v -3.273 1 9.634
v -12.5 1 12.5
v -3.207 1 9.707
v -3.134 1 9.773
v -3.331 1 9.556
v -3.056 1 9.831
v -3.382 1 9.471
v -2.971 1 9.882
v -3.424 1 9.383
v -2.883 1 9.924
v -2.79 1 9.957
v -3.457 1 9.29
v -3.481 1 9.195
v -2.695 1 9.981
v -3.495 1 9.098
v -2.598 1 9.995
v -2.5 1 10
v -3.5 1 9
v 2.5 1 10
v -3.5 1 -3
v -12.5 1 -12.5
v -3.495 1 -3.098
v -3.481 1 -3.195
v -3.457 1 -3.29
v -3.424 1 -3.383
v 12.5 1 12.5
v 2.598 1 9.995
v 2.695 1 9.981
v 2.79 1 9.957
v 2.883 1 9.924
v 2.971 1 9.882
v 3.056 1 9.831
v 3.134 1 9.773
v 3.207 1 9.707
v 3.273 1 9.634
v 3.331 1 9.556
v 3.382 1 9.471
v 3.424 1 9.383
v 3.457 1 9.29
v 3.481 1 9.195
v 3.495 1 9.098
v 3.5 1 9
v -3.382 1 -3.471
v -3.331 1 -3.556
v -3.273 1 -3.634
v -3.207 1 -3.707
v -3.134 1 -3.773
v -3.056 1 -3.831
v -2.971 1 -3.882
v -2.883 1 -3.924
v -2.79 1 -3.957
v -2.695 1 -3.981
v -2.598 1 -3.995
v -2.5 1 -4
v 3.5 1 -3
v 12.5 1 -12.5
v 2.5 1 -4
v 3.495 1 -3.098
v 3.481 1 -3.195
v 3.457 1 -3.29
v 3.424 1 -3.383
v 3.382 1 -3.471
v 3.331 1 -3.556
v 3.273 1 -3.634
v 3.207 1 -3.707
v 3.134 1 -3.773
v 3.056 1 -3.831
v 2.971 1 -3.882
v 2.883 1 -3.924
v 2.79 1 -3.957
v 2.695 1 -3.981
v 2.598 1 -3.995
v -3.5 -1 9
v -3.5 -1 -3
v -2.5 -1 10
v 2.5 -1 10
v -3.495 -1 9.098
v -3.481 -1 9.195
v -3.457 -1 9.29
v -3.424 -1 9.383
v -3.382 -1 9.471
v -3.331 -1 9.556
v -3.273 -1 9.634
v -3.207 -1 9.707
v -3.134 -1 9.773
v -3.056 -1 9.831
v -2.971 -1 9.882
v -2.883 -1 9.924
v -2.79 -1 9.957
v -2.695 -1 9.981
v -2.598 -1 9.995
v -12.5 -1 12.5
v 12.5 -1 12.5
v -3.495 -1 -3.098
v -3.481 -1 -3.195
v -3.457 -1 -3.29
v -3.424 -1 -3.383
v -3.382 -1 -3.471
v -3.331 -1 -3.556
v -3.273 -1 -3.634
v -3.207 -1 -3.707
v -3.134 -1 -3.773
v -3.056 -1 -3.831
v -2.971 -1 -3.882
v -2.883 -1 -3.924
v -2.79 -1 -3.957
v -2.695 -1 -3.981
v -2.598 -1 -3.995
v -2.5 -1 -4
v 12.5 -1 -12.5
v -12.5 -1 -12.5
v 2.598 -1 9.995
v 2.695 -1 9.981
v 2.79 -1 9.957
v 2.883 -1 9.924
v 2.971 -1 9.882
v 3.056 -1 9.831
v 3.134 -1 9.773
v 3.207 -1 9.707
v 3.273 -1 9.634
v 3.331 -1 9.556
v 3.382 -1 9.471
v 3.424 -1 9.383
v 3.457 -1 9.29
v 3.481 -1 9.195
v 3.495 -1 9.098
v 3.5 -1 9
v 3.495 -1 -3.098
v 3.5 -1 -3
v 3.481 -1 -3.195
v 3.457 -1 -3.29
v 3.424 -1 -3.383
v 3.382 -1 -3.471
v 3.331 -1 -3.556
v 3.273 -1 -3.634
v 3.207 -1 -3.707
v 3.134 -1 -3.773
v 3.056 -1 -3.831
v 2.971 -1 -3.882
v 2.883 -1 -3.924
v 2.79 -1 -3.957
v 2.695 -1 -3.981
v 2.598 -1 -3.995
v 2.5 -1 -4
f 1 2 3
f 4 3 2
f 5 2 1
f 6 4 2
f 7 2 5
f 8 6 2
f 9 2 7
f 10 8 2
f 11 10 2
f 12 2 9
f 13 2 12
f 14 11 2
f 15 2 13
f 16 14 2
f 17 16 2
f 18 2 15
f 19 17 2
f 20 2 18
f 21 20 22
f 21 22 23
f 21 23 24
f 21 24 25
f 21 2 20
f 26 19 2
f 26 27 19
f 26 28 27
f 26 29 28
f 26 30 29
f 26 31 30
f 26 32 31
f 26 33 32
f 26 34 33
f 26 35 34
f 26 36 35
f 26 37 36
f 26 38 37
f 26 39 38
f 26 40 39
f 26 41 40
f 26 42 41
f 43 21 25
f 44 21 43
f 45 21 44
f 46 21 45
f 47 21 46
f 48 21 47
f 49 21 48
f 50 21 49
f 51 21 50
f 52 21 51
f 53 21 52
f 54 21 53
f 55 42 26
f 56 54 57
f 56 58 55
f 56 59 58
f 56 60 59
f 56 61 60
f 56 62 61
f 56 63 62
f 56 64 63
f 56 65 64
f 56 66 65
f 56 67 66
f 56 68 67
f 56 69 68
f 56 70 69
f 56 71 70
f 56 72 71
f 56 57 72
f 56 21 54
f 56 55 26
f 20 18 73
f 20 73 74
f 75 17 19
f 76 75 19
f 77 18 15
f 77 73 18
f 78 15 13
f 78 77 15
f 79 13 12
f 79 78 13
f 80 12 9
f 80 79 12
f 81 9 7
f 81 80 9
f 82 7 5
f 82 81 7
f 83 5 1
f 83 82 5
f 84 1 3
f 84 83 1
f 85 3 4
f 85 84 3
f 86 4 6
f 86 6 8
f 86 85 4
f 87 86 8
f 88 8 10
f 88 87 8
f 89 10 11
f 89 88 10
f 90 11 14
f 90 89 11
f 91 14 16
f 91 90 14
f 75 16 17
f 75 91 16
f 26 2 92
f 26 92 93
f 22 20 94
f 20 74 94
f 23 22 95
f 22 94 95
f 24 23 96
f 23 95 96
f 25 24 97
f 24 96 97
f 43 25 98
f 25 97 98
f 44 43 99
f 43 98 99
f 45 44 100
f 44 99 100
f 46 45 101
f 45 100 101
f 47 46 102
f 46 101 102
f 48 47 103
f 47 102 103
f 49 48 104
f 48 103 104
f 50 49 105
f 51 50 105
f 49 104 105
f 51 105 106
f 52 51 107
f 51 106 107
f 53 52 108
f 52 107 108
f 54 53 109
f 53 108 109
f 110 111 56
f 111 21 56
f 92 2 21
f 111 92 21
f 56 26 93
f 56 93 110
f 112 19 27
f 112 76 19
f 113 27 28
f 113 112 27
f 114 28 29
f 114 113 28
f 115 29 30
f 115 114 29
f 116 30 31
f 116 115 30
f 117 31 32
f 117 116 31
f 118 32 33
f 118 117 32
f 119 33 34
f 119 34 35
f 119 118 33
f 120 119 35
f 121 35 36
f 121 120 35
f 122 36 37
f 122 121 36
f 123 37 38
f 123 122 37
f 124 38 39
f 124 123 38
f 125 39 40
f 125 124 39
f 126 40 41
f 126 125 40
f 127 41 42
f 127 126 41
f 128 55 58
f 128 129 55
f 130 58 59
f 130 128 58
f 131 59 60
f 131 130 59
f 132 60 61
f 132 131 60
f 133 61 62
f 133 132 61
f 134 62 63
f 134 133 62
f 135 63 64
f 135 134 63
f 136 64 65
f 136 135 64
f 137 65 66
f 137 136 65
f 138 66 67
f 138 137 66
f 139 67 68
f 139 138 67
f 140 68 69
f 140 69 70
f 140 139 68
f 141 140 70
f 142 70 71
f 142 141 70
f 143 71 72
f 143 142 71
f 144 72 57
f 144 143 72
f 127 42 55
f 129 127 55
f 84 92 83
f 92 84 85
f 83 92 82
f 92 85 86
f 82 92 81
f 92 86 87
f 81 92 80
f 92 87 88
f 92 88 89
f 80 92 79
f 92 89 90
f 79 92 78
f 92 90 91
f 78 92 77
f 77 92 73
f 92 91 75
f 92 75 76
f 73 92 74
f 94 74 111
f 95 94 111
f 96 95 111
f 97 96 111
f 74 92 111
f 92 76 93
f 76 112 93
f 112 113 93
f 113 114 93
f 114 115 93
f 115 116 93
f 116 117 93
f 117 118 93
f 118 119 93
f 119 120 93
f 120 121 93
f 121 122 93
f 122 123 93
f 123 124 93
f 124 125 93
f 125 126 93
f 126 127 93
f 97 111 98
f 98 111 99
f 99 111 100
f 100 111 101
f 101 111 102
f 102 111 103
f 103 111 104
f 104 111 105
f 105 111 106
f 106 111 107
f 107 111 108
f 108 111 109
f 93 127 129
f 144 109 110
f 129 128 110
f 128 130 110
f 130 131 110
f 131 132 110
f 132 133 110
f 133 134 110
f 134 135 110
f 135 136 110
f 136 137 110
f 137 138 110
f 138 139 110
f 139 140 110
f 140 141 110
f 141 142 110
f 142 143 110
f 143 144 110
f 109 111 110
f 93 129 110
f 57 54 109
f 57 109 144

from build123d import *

# Parameters (mm, degrees)
SKETCH1_W           = 25
SKETCH1_H           = 25
BOSS_EXTRUDE1_DEPTH = 1
CUT_EXTRUDE1_REACH  = 19.79
SKETCH2_W           = 7
SKETCH2_H           = 14
FILLET1_R           = 1


with BuildPart() as part:
    # Sketch1 → Boss-Extrude1 (new, symmetric)
    with BuildSketch(Plane(origin=(0, 0, 0), x_dir=(1, 0, 0), z_dir=(0, 1, 0))):
        Rectangle(SKETCH1_W, SKETCH1_H)
    extrude(amount=BOSS_EXTRUDE1_DEPTH, both=True)

    # Sketch2 → Cut-Extrude1 (cut, up to next)
    with BuildSketch(Plane(origin=(0, 1, 0), x_dir=(1, 0, 0), z_dir=(0, 1, 0)), mode=Mode.PRIVATE) as cut_extrude1_sk1:
        with Locations((0, -3)):
            Rectangle(SKETCH2_W, SKETCH2_H)
    cut_extrude1_tool1 = extrude(cut_extrude1_sk1.sketch, amount=-CUT_EXTRUDE1_REACH, mode=Mode.PRIVATE) & part.part
    add(cut_extrude1_tool1.solids().sort_by_distance((0, 1, 3))[0], mode=Mode.SUBTRACT)

    # Fillet1
    fillet1_edges = [part.edges().sort_by_distance(p)[0] for p in [
        (-3.5, 0, 10),
        (-3.5, 0, -4),
        (3.5, 0, -4),
        (3.5, 0, 10),
    ]]
    fillet(fillet1_edges, radius=FILLET1_R)


solid = part.part
